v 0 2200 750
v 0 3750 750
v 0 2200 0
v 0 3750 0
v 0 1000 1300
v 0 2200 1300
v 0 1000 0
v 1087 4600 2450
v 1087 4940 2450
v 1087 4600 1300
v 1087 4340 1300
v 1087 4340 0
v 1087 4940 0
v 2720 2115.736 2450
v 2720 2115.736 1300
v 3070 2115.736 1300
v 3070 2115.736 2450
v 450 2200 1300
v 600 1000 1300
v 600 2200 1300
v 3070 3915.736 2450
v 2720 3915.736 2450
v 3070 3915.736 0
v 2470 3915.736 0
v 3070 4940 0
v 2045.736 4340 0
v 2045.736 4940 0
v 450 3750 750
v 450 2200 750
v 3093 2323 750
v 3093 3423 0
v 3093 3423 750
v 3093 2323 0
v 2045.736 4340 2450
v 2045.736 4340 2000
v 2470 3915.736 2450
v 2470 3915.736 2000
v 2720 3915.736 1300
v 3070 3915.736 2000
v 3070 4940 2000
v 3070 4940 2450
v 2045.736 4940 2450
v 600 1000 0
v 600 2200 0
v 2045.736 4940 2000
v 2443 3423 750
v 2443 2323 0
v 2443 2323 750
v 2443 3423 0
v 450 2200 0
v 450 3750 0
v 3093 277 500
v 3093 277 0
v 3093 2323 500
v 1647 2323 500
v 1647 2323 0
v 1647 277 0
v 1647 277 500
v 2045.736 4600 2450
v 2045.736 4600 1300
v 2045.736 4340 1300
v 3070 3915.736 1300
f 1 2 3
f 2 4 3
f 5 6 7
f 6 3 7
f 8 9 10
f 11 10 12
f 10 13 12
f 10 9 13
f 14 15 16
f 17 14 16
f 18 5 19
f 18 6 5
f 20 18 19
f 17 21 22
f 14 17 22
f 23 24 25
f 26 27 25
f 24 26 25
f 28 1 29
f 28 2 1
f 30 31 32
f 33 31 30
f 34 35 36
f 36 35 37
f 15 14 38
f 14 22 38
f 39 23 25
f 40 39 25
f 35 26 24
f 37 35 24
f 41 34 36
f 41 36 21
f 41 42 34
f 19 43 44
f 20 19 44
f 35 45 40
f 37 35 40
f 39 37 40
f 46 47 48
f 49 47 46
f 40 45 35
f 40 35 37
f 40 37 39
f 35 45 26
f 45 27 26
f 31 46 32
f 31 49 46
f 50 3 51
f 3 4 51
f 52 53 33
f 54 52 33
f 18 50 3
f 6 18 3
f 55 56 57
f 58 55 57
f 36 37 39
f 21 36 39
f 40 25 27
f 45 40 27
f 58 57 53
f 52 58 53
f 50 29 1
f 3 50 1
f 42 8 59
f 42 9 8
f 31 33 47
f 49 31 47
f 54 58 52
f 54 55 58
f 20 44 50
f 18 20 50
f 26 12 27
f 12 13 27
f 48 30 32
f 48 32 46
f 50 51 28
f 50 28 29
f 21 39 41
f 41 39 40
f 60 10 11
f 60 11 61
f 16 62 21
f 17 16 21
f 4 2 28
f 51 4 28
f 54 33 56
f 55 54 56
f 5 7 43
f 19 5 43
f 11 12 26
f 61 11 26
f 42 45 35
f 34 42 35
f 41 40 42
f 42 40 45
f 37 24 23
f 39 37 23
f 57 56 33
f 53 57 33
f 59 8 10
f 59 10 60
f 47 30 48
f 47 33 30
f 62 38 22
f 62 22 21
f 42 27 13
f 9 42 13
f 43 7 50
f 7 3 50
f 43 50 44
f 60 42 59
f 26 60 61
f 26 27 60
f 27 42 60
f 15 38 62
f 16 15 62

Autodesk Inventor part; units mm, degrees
ref_plane "YZ Plane" through (0, 0, 0) normal (1, 0, 0) x (0, 1, 0)
ref_plane "XZ Plane" through (0, 0, 0) normal (0, 1, 0) x (-1, 0, 0)
ref_plane "XY Plane" through (0, 0, 0) normal (0, 0, 1) x (1, 0, 0)
sketch "Sketch1" plane through (0, 0, 0) normal (0, 0, 1) x (1, 0, 0)
  line L0 (0, 0) -> (3070, 0)
  line L1 (3070, 0) -> (3070, 4940)
  line L2 (3070, 4940) -> (0, 4940)
  line L3 (0, 4940) -> (0, 0)
  line L4 (-250, -250) -> (3320, -250)
  line L5 (3320, -250) -> (3320, 5190)
  line L6 (3320, 5190) -> (-250, 5190)
  line L7 (-250, 5190) -> (-250, -250)
  line L8 (57, 5190) -> (1057, 5190)
  line L9 (1057, 5190) -> (1057, 4940)
  line L10 (1057, 4940) -> (57, 4940)
  line L11 (57, 4940) -> (57, 5190)
  dimension "d0" = 3070
  dimension "d1" = 4940
  dimension "d2" = 250
  dimension "d4" = 2013
  dimension "d5" = 1000
sketch "Sketch3" plane through (0, 0, 0) normal (0, 0, 1) x (1, 0, 0)
  line L0 (2045.7359, 4340) -> (2470, 3915.7359)
  line L1 (2470, 3915.7359) -> (3070, 3915.7359)
  line L2 (3070, 3915.7359) -> (3070, 4940)
  line L3 (3070, 4940) -> (2045.7359, 4940)
  line L4 (2045.7359, 4940) -> (2045.7359, 4340)
  line L5 (3070, 4940) -> (0, 4940) projected
  line L6 (3070, 0) -> (3070, 4940) projected
  line L7 (2045.7359, 4940) -> (1087, 4940)
  line L8 (1087, 4940) -> (1087, 4340)
  line L9 (1087, 4340) -> (2045.7359, 4340)
  line L10 (2045.7359, 4340) -> (2045.7359, 4940)
  line L11 (1057, 5190) -> (1057, 4940) projected
  point P0 (0, 0)
  dimension "d6" = 45
  dimension "d7" = 600
  dimension "d9" = 600
  dimension "d10" = 30
extrude "Extrusion1" add sketch "Sketch3" along normal blind 2000 contours L4 L3 L2 L1 L0
extrude "Extrusion2" add sketch "Sketch3" along normal blind 1300 separate body contours L9 L8 L5 L4
sketch "Sketch4" plane through (0, 0, 2000) normal (0, 0, 1) x (1, 0, 0)
  line L0 (2045.7359, 4340) -> (2470, 3915.7359) projected
  line L1 (2470, 3915.7359) -> (3070, 3915.7359) projected
  line L2 (3070, 3915.7359) -> (3070, 4940) projected
  line L3 (3070, 4940) -> (2045.7359, 4940) projected
  line L4 (2045.7359, 4940) -> (2045.7359, 4340) projected
  point P0 (0, 0)
ref_plane "Work Plane1" through (0, 0, 2450) normal (0, 0, -1) x (-1, 0, 0)
extrude "Extrusion3" add sketch "Sketch4" along normal up to surface (450 mm away) separate body
sketch "Sketch5" plane through (0, 0, 1300) normal (0, 0, 1) x (1, 0, 0)
  line L0 (1087, 4940) -> (1087, 4340) projected
  line L1 (2045.7359, 4940) -> (1087, 4940)
  line L2 (1087, 4940) -> (1087, 4600)
  line L3 (1087, 4600) -> (2045.7359, 4600)
  line L4 (2045.7359, 4600) -> (2045.7359, 4940)
  point P0 (0, 0)
  dimension "d18" = 340
extrude "Extrusion4" add sketch "Sketch5" along normal up to surface (1150 mm away) bodies 2
sketch "Sketch6" plane through (2470, 3915.7359, 0) normal (0, -1, 0) x (1, 0, 0)
  line L0 (0, 0) -> (600, 0) projected
  line L1 (600, 2450) -> (250, 2450)
  line L2 (250, 2450) -> (250, 1300)
  line L3 (250, 1300) -> (600, 1300)
  line L4 (600, 1300) -> (600, 2450)
  point P0 (-2470, 0)
  dimension "d22" = 1300
  dimension "d23" = 350
extrude "Extrusion5" add sketch "Sketch6" along normal blind 1800 separate body
sketch "Sketch7" plane through (0, 0, 0) normal (0, 0, 1) x (1, 0, 0)
  line L0 (0, 4940) -> (0, 0) projected
  line L1 (0, 1000) -> (600, 1000)
  line L2 (600, 1000) -> (600, 2200)
  line L3 (600, 2200) -> (0, 2200)
  line L4 (0, 2200) -> (0, 1000)
  line L5 (0, 3750) -> (450, 3750)
  line L6 (450, 3750) -> (450, 2200)
  line L7 (450, 2200) -> (0, 2200)
  line L8 (0, 2200) -> (0, 3750)
  dimension "d26" = 1200
  dimension "d28" = 1550
  dimension "d29" = 450
  dimension "d30" = 600
  dimension "d31" = 1000
extrude "Extrusion6" add sketch "Sketch7" along normal blind 1300 separate body contours L3 L2 L1 L0
extrude "Extrusion7" add sketch "Sketch7" along normal blind 750 separate body contours L5 L6 L3 L0
sketch "Sketch8" plane through (0, 0, 0) normal (0, 0, 1) x (1, 0, 0)
  line L0 (3070, 300) -> (1670, 300) construction
  line L1 (1670, 300) -> (1670, 2300) construction
  line L2 (1670, 2300) -> (3070, 2300) construction
  line L3 (3070, 2300) -> (3070, 300) construction
  line L4 (3070, 3915.7359) -> (3070, 4940) projected
  line L5 (1647, 2323) -> (1647, 277)
  line L6 (1647, 277) -> (3093, 277)
  line L7 (3093, 277) -> (3093, 2323)
  line L8 (3093, 2323) -> (1647, 2323)
  point P0 (0, 0)
  dimension "d36" = 1400
  dimension "d38" = 300
  dimension "d39" = 2000
  dimension "d40" = 23
extrude "Extrusion8" add sketch "Sketch8" along normal blind 500 separate body
ref_plane "Plintuso aukstis" through (0, 0, 70) normal (0, 0, -1) x (-1, 0, 0)
sketch "Sketch9" plane through (0, 0, 0) normal (0, 0, -1) x (-1, 0, 0)
  line L0 (-3093, 2323) -> (-2443, 2323)
  line L1 (-2443, 2323) -> (-2443, 3423)
  line L2 (-2443, 3423) -> (-3093, 3423)
  line L3 (-3093, 3423) -> (-3093, 2323)
  line L4 (-2470, 3915.7359) -> (-3070, 3915.7359) projected
  point P0 (0, 0)
  dimension "d45" = 1100
  dimension "d47" = 650
extrude "Extrusion9" add sketch "Sketch9" against normal blind 750 separate body
properties part number "SkeletonLR_00000000"
